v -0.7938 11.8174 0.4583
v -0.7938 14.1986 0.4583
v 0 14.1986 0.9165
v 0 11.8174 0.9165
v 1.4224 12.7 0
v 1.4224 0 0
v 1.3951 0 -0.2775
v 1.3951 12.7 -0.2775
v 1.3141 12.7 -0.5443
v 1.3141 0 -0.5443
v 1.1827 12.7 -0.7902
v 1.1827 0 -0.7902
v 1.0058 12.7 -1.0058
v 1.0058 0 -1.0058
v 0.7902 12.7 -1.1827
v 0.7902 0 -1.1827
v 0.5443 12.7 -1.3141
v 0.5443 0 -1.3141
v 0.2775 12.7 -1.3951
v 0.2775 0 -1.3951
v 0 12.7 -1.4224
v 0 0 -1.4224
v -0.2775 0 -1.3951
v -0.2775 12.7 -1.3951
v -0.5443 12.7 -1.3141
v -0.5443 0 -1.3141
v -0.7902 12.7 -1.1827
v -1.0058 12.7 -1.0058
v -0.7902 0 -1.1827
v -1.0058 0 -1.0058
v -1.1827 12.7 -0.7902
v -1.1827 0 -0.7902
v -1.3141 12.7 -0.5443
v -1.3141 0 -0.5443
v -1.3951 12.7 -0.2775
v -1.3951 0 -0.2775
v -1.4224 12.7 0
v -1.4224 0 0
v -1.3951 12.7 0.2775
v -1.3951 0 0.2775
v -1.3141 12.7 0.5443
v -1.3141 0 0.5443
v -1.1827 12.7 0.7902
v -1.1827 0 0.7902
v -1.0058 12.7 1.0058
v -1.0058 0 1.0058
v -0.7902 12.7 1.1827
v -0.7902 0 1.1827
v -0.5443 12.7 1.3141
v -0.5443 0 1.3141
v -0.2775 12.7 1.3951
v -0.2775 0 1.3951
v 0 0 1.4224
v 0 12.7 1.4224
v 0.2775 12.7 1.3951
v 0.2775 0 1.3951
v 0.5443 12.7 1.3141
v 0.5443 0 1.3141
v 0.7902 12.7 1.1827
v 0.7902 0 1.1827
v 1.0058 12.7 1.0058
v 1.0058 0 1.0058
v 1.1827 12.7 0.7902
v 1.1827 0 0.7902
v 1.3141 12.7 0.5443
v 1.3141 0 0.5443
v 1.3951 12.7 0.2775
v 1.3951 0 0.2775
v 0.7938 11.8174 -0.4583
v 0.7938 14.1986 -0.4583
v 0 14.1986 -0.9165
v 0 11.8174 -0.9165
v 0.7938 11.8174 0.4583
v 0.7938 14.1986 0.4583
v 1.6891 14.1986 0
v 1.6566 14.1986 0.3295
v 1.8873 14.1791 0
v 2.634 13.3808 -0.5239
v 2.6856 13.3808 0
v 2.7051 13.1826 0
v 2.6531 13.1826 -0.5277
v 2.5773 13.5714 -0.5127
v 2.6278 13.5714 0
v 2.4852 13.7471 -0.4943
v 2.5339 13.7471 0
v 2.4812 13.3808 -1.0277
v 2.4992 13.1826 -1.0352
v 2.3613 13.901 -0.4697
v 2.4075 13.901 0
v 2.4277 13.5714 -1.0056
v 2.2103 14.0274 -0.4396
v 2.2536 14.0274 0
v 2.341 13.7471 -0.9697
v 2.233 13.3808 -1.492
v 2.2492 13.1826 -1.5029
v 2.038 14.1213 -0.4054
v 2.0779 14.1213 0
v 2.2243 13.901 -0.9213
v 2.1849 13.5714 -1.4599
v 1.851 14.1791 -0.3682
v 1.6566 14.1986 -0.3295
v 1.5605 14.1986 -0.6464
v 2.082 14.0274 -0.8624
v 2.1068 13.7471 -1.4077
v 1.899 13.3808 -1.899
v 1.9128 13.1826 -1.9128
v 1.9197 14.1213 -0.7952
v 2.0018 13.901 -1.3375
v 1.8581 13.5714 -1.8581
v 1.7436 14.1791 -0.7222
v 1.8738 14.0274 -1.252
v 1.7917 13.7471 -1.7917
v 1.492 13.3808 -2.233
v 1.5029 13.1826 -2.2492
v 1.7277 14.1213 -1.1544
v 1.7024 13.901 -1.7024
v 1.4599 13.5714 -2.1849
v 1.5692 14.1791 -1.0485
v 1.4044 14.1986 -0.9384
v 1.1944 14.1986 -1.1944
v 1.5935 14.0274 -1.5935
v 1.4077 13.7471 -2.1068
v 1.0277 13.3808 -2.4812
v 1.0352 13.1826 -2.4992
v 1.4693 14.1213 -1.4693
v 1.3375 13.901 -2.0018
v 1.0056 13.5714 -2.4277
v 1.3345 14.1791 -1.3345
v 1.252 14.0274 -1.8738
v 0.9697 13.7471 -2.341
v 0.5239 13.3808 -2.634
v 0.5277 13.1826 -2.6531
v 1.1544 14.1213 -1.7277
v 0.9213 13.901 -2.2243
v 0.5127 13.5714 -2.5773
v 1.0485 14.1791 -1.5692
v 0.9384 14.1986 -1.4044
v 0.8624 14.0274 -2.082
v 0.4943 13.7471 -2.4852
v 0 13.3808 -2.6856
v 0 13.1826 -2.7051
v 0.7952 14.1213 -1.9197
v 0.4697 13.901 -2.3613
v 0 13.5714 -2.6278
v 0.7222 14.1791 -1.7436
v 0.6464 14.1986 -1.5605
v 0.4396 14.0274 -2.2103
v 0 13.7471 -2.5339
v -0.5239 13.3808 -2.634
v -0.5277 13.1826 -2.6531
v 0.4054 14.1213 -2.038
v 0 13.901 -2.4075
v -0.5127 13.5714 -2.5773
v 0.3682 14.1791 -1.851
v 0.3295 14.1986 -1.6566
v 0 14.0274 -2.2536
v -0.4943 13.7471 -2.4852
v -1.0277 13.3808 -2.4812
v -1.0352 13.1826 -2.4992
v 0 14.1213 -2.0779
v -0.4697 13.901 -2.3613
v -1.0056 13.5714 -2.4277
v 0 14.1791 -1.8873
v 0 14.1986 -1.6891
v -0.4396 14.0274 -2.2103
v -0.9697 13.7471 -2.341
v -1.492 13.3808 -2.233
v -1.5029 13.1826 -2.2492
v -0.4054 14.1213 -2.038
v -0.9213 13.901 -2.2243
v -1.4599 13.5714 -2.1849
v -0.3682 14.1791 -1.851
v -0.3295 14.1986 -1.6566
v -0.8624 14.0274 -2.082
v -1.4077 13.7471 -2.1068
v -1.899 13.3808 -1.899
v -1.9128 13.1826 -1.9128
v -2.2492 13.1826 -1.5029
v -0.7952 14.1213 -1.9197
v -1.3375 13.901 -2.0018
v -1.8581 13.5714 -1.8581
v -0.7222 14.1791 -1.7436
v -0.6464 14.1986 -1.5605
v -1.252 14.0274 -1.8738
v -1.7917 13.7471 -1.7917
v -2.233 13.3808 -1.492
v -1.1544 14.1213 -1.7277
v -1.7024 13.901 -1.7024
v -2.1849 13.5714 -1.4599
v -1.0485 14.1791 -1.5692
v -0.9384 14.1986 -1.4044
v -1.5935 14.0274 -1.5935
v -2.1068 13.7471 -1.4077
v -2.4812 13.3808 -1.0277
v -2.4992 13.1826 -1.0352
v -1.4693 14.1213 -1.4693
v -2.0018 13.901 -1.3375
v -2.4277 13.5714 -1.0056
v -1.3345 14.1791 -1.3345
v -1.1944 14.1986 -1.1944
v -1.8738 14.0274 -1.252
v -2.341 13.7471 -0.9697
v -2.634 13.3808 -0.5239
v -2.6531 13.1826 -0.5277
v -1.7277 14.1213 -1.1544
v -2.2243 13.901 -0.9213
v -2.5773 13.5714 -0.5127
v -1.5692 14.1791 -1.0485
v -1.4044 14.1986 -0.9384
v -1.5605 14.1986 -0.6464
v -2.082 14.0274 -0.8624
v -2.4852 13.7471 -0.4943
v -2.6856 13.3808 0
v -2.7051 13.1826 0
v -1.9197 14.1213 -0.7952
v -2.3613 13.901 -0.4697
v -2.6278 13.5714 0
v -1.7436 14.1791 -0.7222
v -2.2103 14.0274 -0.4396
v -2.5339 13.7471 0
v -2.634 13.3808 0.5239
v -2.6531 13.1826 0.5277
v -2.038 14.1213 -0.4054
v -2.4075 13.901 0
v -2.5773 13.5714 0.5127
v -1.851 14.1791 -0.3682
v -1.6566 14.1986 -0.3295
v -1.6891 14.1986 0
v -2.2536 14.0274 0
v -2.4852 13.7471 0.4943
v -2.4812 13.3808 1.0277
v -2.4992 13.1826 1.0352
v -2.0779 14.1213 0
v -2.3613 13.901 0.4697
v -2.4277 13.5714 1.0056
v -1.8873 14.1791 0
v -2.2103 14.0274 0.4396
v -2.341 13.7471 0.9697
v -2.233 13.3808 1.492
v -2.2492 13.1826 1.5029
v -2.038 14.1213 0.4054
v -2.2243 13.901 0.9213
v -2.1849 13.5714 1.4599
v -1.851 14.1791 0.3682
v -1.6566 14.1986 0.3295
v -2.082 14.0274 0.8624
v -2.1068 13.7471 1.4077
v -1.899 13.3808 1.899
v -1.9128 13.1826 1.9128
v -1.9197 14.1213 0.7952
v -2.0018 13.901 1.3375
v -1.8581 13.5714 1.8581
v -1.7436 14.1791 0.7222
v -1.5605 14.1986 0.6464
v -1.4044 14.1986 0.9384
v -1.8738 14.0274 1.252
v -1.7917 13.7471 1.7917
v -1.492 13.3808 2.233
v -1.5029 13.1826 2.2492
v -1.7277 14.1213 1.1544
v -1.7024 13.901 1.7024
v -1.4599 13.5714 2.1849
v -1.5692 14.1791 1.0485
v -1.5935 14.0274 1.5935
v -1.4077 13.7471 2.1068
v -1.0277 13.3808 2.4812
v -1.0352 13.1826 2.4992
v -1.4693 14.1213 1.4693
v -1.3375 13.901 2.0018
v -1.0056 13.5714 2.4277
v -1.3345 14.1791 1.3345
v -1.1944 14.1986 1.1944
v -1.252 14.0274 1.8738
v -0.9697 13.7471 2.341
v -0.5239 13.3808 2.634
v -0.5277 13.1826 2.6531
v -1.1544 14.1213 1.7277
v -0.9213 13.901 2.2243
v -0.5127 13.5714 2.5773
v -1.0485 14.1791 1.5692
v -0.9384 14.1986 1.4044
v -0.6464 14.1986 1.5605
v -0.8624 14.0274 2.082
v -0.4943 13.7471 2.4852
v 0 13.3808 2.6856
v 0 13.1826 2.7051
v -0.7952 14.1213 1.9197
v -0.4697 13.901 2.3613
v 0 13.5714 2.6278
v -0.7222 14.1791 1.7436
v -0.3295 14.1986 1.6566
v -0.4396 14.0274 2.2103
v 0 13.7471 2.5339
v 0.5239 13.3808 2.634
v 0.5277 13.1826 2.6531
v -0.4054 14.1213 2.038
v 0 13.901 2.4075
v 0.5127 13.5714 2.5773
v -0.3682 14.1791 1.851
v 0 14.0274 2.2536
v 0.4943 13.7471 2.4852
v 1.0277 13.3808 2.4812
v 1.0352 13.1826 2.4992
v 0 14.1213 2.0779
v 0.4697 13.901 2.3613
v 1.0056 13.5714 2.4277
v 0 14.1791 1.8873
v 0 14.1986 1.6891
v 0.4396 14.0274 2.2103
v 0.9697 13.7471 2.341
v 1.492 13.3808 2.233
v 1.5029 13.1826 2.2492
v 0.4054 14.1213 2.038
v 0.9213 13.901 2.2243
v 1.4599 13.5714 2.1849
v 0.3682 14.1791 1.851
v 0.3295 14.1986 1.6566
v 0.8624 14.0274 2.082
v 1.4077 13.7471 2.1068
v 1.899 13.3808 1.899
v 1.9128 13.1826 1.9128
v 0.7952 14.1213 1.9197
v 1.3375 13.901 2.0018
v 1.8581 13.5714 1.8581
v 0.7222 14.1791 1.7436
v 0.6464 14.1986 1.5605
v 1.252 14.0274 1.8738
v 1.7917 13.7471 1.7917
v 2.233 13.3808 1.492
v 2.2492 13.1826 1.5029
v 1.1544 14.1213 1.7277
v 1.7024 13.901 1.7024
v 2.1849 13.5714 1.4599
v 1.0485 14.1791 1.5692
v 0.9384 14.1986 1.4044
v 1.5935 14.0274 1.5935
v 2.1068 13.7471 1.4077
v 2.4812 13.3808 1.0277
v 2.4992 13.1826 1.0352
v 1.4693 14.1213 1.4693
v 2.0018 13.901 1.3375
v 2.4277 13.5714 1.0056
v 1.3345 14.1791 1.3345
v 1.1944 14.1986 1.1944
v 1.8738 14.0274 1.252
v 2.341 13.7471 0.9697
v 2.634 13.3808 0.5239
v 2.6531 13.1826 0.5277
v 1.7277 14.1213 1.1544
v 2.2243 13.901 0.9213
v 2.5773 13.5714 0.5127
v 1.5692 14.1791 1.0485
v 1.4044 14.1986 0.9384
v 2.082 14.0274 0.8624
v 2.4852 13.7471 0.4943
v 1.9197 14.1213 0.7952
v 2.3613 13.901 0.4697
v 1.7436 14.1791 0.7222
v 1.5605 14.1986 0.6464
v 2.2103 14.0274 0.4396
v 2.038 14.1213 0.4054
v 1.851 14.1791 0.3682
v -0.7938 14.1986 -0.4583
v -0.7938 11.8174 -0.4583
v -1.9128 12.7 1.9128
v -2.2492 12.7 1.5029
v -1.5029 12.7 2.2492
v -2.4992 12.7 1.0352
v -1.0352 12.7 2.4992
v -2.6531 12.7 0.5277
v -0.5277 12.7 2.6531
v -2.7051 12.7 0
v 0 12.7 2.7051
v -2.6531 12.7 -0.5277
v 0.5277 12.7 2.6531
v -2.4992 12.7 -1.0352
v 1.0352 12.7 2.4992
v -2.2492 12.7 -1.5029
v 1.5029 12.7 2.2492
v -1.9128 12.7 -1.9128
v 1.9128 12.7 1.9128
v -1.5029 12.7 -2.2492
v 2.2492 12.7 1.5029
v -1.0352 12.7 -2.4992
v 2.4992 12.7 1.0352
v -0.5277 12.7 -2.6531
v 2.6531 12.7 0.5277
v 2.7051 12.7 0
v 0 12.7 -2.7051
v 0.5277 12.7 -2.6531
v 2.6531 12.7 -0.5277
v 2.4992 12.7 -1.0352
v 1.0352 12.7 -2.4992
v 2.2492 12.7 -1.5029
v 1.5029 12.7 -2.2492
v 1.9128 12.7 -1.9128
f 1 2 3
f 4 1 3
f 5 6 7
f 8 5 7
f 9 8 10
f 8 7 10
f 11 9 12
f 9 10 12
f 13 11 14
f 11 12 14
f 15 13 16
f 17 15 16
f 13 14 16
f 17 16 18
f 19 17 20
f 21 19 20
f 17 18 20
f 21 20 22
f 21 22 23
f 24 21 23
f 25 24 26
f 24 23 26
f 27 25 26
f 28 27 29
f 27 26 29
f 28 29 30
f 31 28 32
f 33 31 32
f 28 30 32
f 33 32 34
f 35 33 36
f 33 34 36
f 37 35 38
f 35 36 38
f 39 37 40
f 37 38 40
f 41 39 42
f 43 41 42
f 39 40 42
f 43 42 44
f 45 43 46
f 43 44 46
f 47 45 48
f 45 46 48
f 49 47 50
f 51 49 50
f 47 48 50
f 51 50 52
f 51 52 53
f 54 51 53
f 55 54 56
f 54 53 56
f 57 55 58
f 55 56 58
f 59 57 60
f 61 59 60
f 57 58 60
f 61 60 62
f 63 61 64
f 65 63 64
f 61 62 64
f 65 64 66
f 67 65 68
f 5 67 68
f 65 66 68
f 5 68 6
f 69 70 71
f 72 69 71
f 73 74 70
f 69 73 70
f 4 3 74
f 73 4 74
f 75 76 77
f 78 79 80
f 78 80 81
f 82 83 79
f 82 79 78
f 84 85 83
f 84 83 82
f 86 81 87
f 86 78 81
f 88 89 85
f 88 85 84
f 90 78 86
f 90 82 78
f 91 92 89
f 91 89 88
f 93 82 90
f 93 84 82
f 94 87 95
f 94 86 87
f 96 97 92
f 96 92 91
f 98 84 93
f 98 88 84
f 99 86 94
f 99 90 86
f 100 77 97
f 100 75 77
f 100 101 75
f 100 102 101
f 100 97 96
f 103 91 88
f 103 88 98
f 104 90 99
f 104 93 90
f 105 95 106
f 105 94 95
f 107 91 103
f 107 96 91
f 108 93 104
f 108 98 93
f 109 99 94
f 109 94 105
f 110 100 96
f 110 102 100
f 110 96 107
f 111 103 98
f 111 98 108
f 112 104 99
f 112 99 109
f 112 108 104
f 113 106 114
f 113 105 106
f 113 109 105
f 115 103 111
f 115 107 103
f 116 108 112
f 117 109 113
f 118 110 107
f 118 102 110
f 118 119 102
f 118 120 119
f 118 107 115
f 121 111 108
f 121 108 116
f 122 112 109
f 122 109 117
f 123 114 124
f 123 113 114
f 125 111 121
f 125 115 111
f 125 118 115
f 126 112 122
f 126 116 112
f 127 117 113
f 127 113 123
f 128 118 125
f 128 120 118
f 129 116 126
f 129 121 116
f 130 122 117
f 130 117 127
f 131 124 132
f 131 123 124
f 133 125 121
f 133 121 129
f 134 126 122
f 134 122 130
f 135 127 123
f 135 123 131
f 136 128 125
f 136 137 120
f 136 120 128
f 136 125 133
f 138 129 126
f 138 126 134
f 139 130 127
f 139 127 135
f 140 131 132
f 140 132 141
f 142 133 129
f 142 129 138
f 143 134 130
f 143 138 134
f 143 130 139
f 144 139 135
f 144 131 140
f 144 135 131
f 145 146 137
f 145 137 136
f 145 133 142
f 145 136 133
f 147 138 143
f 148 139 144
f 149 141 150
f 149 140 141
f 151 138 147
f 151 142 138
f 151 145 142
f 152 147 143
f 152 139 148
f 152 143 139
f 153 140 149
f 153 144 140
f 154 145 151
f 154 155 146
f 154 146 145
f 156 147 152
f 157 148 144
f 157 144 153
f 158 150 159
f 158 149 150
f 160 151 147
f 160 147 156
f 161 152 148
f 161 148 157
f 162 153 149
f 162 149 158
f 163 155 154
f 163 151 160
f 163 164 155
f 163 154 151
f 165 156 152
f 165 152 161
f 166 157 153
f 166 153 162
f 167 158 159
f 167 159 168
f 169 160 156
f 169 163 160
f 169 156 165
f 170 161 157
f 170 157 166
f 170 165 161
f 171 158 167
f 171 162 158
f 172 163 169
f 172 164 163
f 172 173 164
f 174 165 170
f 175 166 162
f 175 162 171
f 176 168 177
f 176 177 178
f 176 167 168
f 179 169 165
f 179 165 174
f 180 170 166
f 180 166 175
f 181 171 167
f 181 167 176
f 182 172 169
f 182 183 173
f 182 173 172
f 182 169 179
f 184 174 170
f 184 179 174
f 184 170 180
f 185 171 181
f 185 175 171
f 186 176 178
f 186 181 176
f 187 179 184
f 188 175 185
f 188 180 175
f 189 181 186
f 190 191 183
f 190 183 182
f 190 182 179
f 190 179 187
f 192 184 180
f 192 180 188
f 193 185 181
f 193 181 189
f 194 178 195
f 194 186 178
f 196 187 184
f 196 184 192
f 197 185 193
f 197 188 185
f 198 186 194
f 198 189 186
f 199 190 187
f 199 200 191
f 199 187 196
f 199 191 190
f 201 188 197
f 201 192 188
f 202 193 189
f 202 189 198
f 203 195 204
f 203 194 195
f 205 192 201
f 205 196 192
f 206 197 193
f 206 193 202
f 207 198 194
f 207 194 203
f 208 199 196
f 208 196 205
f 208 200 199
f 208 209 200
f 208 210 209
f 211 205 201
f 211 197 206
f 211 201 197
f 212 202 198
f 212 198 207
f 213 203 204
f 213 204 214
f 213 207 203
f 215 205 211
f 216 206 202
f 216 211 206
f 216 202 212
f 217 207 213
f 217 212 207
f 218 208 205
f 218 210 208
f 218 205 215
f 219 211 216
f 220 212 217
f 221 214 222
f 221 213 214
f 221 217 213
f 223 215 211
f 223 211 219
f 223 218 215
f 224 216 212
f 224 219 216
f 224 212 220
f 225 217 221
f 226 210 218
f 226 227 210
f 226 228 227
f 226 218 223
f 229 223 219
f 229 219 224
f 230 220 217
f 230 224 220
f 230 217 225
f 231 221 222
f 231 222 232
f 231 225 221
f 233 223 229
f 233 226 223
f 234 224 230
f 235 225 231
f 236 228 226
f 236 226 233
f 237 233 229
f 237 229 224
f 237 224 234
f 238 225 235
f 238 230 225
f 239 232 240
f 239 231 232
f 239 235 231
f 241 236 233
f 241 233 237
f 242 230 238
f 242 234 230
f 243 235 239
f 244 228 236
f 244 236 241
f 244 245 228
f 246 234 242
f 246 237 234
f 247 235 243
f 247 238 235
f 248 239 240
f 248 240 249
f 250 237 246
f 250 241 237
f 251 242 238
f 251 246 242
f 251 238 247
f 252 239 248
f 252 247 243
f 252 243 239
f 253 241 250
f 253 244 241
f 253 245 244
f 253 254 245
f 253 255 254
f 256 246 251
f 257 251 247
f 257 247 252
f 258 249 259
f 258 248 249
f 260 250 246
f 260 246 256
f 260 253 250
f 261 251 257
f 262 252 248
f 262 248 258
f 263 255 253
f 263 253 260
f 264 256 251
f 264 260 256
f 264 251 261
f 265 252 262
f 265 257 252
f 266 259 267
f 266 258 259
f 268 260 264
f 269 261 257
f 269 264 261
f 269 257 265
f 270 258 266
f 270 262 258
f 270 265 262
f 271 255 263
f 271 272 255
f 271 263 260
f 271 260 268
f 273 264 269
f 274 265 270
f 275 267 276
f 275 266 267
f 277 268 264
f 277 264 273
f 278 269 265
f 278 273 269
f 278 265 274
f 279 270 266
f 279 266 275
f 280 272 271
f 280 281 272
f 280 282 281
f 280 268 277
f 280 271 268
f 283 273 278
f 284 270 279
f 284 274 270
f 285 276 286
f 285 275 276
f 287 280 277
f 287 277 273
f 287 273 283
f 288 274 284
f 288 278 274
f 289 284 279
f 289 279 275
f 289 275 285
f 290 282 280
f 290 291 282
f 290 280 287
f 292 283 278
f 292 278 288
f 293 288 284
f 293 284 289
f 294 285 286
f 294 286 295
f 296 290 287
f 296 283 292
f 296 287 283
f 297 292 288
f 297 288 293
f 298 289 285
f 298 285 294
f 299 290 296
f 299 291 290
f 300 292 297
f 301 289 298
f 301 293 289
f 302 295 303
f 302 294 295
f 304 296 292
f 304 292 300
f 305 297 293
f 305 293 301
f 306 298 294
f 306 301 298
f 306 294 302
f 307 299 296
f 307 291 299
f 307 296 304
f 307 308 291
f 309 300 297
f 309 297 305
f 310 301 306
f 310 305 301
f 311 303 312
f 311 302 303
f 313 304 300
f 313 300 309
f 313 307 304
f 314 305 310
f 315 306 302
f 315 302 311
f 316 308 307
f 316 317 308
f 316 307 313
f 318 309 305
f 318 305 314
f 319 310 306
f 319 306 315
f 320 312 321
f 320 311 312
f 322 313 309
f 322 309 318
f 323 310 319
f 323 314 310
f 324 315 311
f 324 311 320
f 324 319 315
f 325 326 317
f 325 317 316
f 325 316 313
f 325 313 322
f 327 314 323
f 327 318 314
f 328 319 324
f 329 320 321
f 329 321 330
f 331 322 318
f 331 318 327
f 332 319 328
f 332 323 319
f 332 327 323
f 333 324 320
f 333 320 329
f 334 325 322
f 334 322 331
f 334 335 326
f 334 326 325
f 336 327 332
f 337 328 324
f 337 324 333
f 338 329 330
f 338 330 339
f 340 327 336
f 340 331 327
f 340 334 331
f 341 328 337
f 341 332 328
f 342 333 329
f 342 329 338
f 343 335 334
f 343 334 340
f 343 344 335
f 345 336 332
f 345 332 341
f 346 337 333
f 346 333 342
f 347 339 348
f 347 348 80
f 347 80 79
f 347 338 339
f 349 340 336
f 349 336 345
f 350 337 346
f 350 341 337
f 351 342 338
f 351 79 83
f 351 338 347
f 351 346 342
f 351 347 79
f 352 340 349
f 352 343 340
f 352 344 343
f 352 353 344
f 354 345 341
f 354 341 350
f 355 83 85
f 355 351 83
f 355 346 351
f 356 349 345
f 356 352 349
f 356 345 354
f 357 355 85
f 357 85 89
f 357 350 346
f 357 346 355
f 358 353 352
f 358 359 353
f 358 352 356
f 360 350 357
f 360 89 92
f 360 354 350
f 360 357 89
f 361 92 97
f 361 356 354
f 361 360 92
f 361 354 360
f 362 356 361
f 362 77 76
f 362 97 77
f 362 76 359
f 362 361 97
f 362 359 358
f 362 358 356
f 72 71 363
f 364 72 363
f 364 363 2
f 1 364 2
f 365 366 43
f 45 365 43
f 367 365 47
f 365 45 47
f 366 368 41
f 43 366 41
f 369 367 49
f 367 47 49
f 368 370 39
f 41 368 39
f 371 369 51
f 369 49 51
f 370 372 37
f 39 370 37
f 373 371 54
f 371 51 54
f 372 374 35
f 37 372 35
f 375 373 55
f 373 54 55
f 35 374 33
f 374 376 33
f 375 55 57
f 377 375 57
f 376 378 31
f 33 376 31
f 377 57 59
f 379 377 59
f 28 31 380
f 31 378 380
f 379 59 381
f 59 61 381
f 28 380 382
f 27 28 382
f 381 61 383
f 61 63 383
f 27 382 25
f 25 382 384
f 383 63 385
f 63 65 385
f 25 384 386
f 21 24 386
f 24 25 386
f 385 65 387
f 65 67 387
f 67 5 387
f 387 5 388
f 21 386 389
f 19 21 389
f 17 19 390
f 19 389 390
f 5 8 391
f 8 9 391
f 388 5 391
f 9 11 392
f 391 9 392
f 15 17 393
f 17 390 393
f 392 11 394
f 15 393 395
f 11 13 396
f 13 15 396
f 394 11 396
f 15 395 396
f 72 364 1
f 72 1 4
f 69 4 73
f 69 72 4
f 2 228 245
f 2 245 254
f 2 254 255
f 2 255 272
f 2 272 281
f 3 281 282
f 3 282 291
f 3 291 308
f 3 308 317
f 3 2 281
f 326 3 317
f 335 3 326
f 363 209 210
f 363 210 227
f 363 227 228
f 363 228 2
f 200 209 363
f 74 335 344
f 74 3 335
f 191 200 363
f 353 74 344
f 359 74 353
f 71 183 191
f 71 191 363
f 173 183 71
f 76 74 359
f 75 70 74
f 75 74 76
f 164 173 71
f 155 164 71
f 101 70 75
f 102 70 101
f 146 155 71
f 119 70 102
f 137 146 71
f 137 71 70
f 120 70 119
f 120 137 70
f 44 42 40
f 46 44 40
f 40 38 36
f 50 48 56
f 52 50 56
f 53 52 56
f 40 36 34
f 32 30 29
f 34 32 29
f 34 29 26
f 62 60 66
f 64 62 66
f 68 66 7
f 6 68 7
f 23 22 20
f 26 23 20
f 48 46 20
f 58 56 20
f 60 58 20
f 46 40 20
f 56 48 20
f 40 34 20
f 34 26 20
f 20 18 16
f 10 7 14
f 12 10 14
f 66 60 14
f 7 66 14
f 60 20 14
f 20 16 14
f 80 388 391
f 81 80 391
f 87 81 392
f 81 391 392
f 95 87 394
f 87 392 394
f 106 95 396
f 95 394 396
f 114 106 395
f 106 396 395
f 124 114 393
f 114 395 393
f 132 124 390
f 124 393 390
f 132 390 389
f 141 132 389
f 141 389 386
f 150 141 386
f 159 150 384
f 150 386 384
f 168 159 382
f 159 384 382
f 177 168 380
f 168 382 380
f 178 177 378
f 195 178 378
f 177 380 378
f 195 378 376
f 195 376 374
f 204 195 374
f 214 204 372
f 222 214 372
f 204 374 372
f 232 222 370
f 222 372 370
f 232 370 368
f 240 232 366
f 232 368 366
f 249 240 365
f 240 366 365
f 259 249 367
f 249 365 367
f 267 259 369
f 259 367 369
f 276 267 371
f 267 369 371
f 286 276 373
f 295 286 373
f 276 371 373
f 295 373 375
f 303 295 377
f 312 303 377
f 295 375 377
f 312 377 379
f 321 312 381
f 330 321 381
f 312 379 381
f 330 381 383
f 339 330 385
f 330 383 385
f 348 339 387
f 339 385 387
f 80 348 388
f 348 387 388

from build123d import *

# Parameters (mm, degrees)
SKETCH1_R           = 1.4224
BOSS_EXTRUDE1_DEPTH = 12.7
SKETCH2_R           = 2.7051
BOSS_EXTRUDE2_DEPTH = 1.4986
FILLET1_R           = 1.016
CUT_EXTRUDE1_DEPTH  = 2.38125


with BuildPart() as part:
    # Sketch1 → Boss-Extrude1 (new body)
    with BuildSketch(Plane(origin=(0, 0, 0), x_dir=(1, 0, 0), z_dir=(0, 1, 0))):
        Circle(SKETCH1_R)
    extrude(amount=BOSS_EXTRUDE1_DEPTH)

    # Sketch2 → Boss-Extrude2 (add)
    with BuildSketch(Plane(origin=(0, 12.7, 0), x_dir=(1, 0, 0), z_dir=(0, 1, 0))):
        Circle(SKETCH2_R)
    extrude(amount=BOSS_EXTRUDE2_DEPTH)

    # Fillet1
    fillet1_edges = [part.edges().sort_by_distance(p)[0] for p in [
        (-2.7051, 14.1986, 0),
    ]]
    fillet(fillet1_edges, radius=FILLET1_R)

    # Sketch3 → Cut-Extrude1 (cut)
    with BuildSketch(Plane(origin=(0, 14.1986, 0), x_dir=(1, 0, 0), z_dir=(0, 1, 0))):
        Polygon((0, 0.916543552), (-0.79375, 0.458271776), (-0.79375, -0.458271776), (0, -0.916543552), (0.79375, -0.458271776), (0.79375, 0.458271776), align=None)
    extrude(amount=-CUT_EXTRUDE1_DEPTH, mode=Mode.SUBTRACT)


solid = part.part
